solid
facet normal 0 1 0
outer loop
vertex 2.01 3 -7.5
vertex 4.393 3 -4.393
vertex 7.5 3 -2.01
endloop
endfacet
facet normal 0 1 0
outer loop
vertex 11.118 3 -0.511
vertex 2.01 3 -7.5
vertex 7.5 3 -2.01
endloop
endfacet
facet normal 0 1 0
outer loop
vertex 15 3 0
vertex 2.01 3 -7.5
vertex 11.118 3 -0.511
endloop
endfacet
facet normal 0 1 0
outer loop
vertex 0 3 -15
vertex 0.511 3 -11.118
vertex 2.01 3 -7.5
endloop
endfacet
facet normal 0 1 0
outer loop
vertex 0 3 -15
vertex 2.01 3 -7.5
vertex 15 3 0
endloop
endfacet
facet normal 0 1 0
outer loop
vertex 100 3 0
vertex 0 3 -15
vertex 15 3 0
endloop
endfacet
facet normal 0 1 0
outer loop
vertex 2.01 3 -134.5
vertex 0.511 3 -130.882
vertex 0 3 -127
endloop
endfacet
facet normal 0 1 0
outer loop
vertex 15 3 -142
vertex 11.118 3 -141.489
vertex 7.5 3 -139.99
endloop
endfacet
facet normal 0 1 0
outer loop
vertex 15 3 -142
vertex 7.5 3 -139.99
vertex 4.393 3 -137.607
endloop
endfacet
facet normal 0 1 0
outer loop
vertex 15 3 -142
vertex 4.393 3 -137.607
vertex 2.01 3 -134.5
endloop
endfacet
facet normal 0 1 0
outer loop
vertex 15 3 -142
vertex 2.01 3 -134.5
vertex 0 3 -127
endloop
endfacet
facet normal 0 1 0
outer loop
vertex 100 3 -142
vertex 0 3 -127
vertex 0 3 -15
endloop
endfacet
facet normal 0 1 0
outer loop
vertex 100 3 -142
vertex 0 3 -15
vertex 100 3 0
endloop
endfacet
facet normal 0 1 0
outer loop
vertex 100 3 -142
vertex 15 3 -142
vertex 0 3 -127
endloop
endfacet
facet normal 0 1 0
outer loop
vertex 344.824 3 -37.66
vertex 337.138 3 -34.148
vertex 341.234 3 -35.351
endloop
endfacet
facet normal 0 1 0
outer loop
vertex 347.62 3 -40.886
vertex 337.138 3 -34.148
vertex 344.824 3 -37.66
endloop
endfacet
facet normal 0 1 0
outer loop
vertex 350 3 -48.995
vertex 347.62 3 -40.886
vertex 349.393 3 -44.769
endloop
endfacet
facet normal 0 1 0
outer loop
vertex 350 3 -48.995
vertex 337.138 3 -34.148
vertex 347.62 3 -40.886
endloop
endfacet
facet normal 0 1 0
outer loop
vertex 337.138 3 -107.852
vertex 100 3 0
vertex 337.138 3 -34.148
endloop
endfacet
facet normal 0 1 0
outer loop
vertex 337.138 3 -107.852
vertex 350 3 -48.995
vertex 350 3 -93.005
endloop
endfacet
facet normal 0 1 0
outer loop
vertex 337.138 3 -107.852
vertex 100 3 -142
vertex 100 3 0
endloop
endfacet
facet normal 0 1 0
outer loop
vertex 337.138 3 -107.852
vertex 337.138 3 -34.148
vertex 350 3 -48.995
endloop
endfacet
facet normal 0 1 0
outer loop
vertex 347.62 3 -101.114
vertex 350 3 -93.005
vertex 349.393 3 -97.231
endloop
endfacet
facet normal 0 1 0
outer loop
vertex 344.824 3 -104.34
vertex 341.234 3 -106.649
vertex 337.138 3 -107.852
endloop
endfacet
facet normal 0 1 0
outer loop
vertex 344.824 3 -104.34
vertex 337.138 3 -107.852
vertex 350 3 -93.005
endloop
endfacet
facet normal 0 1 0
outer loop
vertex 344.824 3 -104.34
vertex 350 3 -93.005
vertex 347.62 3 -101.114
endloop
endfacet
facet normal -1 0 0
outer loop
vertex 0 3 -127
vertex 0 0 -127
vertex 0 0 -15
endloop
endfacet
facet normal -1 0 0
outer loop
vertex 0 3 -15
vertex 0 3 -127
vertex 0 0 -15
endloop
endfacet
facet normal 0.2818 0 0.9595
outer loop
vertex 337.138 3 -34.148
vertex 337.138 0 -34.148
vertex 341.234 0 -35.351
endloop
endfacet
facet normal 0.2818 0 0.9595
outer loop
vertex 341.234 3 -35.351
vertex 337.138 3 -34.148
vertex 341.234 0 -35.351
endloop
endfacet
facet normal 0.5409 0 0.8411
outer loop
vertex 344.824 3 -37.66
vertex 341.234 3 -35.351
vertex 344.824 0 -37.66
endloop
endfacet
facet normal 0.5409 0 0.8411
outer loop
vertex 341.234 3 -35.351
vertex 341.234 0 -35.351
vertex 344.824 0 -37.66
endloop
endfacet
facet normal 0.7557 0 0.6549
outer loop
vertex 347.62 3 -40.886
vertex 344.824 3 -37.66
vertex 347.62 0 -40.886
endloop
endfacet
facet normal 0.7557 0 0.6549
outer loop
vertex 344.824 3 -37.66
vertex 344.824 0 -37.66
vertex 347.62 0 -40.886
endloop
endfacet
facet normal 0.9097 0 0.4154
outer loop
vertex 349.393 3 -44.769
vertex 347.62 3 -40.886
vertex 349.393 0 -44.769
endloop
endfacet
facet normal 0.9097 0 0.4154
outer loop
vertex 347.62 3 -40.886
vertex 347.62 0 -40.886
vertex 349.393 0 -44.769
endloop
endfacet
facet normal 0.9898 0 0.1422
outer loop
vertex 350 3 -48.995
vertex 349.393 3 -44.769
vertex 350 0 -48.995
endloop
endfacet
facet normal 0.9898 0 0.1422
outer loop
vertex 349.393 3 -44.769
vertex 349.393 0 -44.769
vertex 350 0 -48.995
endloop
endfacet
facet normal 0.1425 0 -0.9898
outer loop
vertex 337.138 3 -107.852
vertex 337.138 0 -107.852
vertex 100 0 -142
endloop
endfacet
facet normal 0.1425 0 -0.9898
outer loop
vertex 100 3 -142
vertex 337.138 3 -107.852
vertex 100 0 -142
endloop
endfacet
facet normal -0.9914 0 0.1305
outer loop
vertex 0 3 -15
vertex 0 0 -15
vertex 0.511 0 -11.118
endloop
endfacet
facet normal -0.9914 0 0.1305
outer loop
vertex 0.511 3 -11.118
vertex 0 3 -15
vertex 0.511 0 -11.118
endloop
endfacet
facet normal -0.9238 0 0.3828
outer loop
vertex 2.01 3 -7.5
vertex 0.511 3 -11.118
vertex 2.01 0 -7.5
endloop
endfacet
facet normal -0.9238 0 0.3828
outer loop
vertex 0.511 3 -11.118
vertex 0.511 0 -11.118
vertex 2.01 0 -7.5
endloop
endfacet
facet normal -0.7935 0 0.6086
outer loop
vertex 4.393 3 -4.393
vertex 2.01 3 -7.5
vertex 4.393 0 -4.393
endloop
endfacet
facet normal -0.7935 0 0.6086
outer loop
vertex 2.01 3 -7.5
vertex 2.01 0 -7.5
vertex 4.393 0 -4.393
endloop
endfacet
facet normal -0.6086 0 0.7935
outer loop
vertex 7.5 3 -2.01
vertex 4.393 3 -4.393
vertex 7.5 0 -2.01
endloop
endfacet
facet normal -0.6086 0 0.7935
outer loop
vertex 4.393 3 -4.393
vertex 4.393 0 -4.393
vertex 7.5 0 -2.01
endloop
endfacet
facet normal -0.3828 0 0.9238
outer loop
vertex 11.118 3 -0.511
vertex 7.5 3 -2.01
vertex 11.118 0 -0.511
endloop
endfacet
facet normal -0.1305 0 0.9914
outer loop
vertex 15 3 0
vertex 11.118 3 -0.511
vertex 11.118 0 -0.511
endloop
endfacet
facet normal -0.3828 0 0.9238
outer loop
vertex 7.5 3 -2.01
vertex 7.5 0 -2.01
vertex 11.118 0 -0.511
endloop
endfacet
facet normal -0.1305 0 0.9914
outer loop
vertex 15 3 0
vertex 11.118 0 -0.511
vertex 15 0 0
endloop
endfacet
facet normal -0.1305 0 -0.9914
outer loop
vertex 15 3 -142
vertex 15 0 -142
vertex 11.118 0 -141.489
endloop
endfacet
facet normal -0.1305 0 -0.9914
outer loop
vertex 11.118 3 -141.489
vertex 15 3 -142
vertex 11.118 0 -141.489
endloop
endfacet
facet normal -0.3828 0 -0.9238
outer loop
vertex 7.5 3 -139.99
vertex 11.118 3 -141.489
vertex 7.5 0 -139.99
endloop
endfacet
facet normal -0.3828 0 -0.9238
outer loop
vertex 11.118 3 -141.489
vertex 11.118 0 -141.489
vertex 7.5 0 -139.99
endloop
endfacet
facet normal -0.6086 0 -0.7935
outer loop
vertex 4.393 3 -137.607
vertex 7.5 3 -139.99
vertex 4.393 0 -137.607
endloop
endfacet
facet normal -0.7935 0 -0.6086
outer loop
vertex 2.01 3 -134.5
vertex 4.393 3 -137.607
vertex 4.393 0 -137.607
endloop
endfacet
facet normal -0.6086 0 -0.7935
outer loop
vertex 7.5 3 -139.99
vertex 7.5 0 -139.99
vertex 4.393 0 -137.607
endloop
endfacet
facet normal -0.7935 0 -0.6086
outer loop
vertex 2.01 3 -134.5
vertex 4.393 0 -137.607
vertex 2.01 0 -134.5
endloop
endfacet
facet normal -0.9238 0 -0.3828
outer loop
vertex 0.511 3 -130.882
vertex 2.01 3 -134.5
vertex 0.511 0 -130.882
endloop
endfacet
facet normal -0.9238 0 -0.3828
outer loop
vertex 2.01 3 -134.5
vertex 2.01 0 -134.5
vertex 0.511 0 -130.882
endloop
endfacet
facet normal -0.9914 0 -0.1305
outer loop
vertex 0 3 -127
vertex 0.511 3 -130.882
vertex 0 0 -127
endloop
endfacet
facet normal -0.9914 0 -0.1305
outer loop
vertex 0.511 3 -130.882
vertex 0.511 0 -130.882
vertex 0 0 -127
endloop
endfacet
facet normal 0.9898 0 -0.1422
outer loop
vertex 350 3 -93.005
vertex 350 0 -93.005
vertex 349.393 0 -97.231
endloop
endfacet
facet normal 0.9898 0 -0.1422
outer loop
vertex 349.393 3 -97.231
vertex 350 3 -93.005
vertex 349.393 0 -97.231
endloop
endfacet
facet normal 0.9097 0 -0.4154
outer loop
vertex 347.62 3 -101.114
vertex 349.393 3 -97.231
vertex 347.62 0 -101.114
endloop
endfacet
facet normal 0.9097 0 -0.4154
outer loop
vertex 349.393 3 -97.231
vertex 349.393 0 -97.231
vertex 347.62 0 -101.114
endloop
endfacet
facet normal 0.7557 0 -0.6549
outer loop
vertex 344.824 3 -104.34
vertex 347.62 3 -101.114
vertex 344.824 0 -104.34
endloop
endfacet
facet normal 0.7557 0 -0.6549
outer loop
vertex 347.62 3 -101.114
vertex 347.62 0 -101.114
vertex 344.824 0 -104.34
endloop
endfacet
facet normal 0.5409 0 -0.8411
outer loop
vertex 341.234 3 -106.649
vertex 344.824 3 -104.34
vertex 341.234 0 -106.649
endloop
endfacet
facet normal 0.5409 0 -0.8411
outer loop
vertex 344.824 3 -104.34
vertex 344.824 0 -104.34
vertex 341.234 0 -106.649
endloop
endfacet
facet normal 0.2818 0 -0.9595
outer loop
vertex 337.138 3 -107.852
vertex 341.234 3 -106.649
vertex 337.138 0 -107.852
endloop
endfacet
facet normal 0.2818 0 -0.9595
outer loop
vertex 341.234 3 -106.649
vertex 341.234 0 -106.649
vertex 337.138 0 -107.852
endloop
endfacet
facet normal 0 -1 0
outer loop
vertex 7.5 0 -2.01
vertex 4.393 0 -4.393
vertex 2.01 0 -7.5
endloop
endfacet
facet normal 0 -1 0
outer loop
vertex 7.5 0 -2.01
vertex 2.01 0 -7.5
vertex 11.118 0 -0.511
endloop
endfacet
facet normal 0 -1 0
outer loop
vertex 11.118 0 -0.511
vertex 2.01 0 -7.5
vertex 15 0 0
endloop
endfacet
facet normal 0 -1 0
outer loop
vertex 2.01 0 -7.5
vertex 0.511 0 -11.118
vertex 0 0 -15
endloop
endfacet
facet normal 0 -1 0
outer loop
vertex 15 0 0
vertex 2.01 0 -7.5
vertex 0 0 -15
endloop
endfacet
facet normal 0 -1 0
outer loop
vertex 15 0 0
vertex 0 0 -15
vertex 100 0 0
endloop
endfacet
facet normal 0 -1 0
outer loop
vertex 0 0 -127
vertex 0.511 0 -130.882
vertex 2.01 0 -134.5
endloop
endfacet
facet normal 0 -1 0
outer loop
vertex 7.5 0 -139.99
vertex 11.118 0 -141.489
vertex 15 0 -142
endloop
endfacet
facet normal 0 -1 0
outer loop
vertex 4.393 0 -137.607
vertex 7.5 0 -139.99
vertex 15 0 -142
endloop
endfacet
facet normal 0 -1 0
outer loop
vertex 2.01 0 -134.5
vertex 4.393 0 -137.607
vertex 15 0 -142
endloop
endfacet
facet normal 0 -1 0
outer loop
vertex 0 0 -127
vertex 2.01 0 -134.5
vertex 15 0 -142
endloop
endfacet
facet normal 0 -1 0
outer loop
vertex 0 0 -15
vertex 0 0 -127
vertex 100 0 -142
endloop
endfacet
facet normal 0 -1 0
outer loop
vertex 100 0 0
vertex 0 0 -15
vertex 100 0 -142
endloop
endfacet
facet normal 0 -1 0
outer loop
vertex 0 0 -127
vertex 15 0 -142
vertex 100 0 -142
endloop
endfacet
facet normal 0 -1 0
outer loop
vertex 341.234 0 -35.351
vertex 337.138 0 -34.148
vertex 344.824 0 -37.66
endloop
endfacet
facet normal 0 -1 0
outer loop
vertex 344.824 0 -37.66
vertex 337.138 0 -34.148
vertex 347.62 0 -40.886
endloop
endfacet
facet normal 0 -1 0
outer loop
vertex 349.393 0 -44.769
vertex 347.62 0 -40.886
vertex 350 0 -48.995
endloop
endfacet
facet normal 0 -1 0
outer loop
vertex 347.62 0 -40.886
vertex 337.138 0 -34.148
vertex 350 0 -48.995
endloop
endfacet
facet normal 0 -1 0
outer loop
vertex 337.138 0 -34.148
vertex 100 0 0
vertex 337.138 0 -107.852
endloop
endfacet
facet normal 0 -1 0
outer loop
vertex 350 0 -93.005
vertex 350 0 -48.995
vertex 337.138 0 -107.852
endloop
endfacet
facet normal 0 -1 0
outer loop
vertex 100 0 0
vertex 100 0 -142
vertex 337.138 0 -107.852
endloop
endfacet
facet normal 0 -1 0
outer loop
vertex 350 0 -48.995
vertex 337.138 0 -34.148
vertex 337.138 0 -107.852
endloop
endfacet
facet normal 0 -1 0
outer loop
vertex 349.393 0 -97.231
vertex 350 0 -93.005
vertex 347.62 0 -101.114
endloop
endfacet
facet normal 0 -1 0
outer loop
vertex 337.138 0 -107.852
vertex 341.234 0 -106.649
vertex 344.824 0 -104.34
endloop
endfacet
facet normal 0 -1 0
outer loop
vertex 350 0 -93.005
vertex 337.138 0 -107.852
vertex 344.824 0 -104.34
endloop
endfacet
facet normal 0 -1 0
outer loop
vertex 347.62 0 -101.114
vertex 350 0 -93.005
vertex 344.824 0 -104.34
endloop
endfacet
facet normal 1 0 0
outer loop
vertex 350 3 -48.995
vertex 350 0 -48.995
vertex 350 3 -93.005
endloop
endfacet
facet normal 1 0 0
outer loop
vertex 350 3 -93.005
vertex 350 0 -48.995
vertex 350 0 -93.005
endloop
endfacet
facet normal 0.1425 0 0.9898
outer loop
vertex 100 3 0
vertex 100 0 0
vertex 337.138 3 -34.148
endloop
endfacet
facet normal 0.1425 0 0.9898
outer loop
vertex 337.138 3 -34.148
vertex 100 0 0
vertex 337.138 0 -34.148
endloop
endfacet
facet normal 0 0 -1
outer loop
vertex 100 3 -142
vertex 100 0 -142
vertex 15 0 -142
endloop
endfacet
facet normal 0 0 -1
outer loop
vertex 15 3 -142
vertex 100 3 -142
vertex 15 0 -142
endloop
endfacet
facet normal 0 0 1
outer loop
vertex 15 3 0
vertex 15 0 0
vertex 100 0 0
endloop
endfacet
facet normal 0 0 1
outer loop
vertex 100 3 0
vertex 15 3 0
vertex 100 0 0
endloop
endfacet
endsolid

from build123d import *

# Parameters (mm, degrees)
BOSS_EXTRUDE1_DEPTH = 3


with BuildPart() as part:
    # Sketch1 → Boss-Extrude1 (new body)
    with BuildSketch(Plane(origin=(0, 0, 0), x_dir=(1, 0, 0), z_dir=(0, 1, 0))):
        with BuildLine():
            Line((15, 0), (100, 0))
            Line((100, 0), (337.137947494, 34.147864439))
            ThreePointArc((337.137947494, 34.147864439), (346.33731036, 39.173042252), (350, 48.994722036))
            Line((350, 48.994722036), (350, 93.005277964))
            ThreePointArc((350, 93.005277964), (346.33731036, 102.826957748), (337.137947494, 107.852135561))
            Line((337.137947494, 107.852135561), (100, 142))
            Line((100, 142), (15, 142))
            ThreePointArc((15, 142), (4.393398282, 137.606601718), (0, 127))
            Line((0, 127), (0, 15))
            ThreePointArc((0, 15), (4.393398282, 4.393398282), (15, 0))
        make_face()
    extrude(amount=BOSS_EXTRUDE1_DEPTH)


solid = part.part
